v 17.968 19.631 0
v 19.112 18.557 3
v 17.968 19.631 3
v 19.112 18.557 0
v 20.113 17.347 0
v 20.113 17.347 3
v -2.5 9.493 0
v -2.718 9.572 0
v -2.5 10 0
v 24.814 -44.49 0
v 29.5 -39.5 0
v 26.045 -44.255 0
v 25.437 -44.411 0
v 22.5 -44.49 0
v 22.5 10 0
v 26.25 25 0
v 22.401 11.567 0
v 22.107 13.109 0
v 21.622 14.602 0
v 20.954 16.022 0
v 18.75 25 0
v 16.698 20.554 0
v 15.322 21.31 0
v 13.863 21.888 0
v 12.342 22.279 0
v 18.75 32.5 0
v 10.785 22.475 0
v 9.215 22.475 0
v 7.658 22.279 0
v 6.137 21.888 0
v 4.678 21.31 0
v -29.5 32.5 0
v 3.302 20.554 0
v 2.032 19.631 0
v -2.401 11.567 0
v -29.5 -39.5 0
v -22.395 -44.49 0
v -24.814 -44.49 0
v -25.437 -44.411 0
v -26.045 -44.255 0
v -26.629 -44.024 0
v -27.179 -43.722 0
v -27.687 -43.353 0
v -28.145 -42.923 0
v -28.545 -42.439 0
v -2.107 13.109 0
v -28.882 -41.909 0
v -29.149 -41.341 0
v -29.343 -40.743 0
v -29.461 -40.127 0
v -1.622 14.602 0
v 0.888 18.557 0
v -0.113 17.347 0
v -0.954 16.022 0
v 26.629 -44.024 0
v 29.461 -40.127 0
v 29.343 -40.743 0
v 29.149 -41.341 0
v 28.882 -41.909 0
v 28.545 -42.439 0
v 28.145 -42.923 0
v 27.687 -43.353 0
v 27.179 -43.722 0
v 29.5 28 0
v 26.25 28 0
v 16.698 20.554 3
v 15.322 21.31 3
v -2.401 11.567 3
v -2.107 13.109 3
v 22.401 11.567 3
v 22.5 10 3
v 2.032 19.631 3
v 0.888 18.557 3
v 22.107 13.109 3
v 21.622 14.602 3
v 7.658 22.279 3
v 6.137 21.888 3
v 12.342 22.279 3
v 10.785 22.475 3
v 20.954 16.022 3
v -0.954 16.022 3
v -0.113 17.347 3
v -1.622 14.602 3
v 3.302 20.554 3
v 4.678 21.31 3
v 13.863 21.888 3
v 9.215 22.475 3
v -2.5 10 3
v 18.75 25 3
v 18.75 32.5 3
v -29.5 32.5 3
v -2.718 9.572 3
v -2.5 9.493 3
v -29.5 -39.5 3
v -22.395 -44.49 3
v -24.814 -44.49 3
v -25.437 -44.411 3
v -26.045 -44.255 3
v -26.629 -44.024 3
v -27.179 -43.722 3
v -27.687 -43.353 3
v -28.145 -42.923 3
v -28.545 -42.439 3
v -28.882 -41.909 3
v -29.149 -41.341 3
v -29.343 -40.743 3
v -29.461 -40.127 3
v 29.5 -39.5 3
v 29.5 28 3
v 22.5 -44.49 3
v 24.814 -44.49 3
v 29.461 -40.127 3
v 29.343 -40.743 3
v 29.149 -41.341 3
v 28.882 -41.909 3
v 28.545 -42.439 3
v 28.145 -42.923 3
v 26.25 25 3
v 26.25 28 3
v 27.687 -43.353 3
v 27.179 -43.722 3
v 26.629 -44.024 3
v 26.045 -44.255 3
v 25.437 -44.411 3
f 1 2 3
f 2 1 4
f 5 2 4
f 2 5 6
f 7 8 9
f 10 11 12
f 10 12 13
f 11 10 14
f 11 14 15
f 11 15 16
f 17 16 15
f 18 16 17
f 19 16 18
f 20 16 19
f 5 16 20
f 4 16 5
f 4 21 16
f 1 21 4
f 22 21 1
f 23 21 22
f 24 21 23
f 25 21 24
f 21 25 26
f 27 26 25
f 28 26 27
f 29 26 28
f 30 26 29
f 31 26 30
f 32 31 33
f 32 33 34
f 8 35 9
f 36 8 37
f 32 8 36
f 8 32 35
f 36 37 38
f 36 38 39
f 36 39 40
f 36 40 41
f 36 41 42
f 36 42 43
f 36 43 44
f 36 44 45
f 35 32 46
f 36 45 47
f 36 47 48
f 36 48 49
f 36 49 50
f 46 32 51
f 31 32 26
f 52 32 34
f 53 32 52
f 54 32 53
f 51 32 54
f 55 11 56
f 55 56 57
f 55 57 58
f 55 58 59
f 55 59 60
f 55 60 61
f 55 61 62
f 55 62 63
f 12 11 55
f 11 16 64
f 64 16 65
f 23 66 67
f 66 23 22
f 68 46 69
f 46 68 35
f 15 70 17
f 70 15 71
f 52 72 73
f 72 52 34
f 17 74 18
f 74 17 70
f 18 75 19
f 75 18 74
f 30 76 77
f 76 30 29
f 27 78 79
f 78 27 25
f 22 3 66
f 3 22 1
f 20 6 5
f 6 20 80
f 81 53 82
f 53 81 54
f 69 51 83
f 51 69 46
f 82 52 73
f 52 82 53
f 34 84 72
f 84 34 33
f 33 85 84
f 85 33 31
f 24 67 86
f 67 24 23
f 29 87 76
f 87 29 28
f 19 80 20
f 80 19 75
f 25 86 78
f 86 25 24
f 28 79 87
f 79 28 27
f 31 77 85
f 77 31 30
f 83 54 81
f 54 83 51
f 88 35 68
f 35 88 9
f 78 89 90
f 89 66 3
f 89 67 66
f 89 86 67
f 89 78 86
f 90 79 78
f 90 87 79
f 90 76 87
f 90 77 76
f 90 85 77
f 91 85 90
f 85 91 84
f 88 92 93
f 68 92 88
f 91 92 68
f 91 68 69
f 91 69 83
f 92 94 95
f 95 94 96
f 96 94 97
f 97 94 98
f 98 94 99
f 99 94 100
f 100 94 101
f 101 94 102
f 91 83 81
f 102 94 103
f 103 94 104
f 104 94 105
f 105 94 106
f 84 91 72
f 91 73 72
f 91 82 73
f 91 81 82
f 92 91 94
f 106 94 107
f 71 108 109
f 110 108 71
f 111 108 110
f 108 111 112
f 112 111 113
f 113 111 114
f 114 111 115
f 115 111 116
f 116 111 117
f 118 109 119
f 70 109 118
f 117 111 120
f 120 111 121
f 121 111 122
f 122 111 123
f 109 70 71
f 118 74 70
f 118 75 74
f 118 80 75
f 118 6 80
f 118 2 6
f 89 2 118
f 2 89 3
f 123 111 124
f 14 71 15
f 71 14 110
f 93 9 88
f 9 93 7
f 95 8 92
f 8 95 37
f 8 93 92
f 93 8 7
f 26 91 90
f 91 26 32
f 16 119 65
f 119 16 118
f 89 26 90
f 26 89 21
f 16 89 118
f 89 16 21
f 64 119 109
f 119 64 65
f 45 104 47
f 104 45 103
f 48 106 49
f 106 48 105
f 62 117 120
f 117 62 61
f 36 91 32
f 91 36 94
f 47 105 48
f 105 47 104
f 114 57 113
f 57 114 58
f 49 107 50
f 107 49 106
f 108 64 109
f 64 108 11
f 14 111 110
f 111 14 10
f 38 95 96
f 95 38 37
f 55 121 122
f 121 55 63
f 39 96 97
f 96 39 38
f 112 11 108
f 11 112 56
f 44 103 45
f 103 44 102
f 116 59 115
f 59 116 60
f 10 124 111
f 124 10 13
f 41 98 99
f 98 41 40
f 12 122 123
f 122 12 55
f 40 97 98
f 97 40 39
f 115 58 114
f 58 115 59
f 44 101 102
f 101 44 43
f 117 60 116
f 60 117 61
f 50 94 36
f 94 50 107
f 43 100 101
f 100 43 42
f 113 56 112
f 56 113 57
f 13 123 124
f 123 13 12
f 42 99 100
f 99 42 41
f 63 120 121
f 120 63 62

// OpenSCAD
$fn = 50;


difference() {
	union() {
		hull() {
			translate(v = [-24.5000000000, 39.5000000000, 0]) {
				cylinder(h = 3, r = 5);
			}
			translate(v = [24.5000000000, 39.5000000000, 0]) {
				cylinder(h = 3, r = 5);
			}
			translate(v = [-24.5000000000, -39.5000000000, 0]) {
				cylinder(h = 3, r = 5);
			}
			translate(v = [24.5000000000, -39.5000000000, 0]) {
				cylinder(h = 3, r = 5);
			}
		}
	}
	union() {
		#translate(v = [10, 10, 0.0000000000]) {
			cylinder(h = 3, r = 12.5000000000);
		}
		#translate(v = [-2.5000000000, -80.0000000000, 0]) {
			cube(size = [25, 90, 3]);
		}
		#translate(v = [-33.5000000000, -75.0000000000, 0]) {
			rotate(a = [0, 0, 340]) {
				cube(size = [25, 90, 3]);
			}
		}
		#translate(v = [-66.0000000000, 32.5000000000, 0]) {
			cube(size = [100, 85, 3]);
		}
		#translate(v = [18.7500000000, 25.0000000000, 0]) {
			cube(size = [7.5000000000, 100, 3]);
		}
		#translate(v = [26.0000000000, 28.0000000000, 0]) {
			cube(size = [7, 94, 3]);
		}
	}
}
